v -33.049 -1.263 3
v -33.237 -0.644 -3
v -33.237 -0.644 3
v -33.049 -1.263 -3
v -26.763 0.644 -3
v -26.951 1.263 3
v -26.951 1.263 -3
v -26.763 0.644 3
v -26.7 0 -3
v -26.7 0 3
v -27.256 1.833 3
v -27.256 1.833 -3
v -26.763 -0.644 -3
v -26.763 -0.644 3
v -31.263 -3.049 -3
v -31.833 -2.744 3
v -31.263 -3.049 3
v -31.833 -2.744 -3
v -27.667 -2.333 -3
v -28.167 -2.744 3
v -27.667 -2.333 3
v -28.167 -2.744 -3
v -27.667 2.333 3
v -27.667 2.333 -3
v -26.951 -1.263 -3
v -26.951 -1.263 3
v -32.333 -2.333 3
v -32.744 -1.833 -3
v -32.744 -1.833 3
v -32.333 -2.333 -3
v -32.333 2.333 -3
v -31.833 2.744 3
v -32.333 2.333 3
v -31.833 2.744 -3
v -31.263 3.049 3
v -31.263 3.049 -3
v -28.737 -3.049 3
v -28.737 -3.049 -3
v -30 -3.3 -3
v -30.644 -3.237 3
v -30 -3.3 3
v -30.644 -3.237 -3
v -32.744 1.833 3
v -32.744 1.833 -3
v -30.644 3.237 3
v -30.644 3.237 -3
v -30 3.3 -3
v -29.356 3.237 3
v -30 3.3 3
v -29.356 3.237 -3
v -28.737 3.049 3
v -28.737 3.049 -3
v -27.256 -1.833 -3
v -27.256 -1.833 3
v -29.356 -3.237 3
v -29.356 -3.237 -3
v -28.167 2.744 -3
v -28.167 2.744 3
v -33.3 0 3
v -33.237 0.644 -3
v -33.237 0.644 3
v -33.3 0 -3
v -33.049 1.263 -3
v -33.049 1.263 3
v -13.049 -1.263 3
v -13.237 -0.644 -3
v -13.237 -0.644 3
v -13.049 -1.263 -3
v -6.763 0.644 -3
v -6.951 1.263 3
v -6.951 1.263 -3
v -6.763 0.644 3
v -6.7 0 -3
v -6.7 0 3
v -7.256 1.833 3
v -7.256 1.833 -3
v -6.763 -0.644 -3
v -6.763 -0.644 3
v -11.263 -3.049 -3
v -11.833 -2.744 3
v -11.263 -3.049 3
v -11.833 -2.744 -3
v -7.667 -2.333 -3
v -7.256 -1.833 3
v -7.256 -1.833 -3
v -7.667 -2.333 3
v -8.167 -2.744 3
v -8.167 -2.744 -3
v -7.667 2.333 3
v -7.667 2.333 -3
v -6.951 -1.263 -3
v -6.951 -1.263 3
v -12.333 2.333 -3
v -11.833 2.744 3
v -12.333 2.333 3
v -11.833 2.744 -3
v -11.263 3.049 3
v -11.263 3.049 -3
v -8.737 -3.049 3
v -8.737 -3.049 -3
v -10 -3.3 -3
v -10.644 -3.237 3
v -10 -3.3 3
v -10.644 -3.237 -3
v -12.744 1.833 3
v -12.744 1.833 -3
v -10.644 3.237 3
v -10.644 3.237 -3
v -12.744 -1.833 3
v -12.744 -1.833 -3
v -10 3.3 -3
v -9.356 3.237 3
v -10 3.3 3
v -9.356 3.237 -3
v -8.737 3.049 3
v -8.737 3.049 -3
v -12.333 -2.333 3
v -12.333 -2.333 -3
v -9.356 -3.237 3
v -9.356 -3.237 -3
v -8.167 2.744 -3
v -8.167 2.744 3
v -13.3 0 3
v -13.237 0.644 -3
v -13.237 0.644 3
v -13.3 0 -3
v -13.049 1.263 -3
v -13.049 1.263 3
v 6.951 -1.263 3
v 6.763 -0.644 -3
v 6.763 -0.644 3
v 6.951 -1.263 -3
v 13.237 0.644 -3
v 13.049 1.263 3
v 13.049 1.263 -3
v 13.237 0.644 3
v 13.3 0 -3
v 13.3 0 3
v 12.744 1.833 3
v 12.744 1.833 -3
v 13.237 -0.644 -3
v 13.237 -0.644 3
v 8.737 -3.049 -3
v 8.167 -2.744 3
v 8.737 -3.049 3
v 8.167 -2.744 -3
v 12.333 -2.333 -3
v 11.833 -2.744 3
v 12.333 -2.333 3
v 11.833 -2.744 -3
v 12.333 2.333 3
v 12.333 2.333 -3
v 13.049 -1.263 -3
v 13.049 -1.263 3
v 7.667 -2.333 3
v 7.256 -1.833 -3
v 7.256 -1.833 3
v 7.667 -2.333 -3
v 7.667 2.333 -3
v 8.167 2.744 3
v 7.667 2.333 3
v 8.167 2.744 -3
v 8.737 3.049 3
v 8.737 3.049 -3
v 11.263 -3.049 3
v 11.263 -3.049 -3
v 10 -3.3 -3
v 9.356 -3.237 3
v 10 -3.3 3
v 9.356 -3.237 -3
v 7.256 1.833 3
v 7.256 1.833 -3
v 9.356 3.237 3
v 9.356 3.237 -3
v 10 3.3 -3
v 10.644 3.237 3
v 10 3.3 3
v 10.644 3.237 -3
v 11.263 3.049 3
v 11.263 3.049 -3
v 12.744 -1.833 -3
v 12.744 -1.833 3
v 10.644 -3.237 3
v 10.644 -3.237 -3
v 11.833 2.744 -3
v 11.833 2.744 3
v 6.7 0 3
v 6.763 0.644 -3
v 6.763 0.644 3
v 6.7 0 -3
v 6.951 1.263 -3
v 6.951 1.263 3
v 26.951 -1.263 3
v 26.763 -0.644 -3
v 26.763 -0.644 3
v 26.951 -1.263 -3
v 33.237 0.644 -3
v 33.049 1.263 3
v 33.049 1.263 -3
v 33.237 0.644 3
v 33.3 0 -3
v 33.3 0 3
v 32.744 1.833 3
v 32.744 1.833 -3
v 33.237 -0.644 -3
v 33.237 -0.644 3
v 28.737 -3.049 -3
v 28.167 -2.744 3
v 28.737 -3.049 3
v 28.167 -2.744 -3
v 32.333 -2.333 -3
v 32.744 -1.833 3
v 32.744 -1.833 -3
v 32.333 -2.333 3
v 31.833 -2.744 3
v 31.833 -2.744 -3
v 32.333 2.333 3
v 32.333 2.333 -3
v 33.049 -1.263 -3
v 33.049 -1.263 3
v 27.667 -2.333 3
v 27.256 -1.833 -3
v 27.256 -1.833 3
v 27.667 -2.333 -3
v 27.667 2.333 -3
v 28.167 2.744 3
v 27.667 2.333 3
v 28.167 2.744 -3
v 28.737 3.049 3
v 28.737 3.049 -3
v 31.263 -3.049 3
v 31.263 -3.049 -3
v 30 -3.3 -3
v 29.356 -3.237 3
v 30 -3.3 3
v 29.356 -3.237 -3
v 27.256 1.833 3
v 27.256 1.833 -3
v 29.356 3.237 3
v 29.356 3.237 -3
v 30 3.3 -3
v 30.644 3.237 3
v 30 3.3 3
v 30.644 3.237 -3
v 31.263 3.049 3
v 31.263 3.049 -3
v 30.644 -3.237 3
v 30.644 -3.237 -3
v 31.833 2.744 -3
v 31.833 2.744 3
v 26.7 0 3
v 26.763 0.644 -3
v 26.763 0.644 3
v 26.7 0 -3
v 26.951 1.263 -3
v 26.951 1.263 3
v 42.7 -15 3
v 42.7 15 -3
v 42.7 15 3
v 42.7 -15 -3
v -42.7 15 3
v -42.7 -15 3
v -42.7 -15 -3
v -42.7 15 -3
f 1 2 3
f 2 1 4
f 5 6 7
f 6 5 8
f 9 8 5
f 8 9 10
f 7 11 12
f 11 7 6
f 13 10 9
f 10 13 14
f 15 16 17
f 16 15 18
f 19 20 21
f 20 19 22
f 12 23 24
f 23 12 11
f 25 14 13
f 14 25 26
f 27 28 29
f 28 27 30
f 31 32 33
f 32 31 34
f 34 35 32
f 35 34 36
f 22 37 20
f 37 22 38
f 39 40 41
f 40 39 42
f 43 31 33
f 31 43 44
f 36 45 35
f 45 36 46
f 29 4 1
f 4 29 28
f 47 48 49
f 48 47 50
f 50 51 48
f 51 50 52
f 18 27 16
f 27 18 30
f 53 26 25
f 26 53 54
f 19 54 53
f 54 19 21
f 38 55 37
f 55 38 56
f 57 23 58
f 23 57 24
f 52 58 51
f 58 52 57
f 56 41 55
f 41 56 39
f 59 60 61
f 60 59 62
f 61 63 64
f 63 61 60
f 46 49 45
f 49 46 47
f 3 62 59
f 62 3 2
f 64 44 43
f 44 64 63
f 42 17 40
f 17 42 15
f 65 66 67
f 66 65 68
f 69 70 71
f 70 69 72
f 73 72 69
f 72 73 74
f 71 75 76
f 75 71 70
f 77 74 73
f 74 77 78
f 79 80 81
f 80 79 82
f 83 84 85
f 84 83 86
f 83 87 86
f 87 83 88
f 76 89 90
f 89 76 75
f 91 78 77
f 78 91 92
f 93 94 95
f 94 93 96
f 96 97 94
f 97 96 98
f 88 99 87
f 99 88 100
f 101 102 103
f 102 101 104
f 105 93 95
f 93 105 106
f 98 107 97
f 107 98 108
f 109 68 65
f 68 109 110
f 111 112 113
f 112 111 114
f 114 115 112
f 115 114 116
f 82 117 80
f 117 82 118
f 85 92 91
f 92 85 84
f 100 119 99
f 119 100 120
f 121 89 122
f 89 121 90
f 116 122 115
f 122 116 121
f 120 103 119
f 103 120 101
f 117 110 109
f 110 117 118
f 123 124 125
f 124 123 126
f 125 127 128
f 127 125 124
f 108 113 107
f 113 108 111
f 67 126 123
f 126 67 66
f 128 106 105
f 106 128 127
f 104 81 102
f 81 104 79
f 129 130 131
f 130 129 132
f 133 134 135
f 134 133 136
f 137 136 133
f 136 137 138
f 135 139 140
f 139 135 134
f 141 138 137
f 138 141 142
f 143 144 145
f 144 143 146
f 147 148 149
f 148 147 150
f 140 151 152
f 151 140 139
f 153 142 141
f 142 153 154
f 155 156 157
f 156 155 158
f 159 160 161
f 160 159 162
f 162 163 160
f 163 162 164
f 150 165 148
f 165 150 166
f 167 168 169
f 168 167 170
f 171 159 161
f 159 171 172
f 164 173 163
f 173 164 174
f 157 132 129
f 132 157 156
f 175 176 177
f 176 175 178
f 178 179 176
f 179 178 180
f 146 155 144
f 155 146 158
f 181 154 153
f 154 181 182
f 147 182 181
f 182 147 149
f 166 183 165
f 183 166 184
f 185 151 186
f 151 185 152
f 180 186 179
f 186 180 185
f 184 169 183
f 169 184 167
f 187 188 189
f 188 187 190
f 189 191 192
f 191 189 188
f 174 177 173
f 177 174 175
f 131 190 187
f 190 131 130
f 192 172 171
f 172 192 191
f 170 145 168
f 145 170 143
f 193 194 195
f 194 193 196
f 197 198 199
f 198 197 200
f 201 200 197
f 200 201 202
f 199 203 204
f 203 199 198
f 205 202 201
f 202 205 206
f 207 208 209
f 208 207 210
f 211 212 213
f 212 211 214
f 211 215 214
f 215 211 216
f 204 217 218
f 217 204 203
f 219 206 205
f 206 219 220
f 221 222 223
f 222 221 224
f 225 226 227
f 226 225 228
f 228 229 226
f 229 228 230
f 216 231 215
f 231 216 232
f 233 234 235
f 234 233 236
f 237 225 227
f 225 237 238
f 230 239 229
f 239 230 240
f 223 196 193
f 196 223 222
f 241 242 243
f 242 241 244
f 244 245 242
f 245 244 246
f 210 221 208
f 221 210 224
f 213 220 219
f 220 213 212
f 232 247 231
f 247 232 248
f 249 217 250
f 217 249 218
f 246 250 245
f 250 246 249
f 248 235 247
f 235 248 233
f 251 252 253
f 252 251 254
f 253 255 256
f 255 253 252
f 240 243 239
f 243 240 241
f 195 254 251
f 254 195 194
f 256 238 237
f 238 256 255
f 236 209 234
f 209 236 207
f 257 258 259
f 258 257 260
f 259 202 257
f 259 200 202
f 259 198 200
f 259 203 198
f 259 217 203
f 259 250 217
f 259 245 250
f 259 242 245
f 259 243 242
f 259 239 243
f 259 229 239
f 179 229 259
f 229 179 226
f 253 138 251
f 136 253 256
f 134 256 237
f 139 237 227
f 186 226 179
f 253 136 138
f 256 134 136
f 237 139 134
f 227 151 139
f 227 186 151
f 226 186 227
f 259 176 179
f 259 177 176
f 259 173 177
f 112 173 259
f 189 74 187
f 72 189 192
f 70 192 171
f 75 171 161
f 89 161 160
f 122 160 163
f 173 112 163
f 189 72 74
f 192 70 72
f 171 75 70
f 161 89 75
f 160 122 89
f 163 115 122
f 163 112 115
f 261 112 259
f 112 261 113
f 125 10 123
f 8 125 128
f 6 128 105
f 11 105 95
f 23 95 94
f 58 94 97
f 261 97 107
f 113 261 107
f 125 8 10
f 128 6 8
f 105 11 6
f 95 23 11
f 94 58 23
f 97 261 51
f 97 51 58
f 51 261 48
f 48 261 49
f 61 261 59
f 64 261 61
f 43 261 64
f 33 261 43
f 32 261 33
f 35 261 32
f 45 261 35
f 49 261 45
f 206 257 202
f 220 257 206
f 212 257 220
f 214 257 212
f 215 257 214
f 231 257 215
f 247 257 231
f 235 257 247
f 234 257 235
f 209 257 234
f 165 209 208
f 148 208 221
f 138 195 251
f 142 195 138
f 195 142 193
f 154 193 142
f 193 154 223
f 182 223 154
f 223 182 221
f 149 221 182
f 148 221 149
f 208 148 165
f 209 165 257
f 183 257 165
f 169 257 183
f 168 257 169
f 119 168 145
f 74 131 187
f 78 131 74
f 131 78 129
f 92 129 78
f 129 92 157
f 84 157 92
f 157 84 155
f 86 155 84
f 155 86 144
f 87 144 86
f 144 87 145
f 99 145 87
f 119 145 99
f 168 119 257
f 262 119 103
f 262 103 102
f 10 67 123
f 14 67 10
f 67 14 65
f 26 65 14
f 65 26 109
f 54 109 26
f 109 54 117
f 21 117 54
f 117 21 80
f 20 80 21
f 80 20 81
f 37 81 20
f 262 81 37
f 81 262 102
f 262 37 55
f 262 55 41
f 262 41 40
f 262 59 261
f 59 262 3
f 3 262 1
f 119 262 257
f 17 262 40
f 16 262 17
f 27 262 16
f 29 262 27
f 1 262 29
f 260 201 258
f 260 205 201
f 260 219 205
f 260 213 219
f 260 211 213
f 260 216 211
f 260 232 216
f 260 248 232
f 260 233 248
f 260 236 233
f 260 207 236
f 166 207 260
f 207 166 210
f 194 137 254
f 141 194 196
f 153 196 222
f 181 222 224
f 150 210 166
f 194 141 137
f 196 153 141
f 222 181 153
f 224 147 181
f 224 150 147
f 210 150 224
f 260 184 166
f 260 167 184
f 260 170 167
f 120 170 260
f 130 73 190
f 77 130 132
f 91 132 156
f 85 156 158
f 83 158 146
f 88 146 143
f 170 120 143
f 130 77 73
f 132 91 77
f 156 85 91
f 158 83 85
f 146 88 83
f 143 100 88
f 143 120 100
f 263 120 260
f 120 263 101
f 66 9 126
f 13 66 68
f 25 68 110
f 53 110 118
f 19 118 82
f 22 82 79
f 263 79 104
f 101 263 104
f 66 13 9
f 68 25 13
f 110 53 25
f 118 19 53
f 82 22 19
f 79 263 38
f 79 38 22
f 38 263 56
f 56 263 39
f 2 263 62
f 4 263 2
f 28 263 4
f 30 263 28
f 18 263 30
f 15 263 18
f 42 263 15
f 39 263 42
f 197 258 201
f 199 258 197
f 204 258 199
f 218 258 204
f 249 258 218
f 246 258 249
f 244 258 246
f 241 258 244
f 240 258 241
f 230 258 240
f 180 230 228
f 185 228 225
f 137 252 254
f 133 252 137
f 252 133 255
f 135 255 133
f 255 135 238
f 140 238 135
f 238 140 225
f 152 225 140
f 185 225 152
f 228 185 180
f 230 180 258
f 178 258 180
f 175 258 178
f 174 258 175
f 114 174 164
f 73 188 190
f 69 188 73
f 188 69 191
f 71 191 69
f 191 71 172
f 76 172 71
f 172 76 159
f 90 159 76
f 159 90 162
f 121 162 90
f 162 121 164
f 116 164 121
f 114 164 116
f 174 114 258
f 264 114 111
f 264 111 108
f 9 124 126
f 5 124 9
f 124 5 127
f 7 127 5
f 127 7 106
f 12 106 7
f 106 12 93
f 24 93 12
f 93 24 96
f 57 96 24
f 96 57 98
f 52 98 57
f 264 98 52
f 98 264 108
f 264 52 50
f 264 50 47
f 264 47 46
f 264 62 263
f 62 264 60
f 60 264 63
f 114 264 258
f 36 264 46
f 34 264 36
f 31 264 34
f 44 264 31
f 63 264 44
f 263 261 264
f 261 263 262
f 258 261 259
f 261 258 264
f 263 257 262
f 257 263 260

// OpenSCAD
$fn = 32;

// ----------------------------------------------------------------------
// Hole bar, 4 x Ø6.6
// row layout, 12.7 mm edge offset
// ----------------------------------------------------------------------

// --- parameters (mm) ---
bar_w = 30;    // bar width (Y)
bar_t = 6;     // bar thickness (Z)
holes = 4;     // holes per row
hole_d = 6.6;  // hole diameter
edge = 12.7;   // offset from the bar end to the first hole
pitch = 20;    // pitch between neighbouring holes

// --- derived feature positions (mm) ---
span = (holes - 1) * pitch;   // = 60   distance between the end holes
bar_l = span + 2 * edge;      // = 85.4   overall bar length
start_x = -bar_l / 2 + edge;  // = -30   X of the first hole
feature_centers = [
  [start_x + 0 * pitch, 0],
  [start_x + 1 * pitch, 0],
  [start_x + 2 * pitch, 0],
  [start_x + 3 * pitch, 0]
];   // hole centres of the first row

// bar with one row of holes, drilled from feature_centers
difference() {
  translate([-bar_l / 2, -bar_w / 2, -bar_t / 2]) cube([bar_l, bar_w, bar_t]);
  for (centre = feature_centers)
    translate([centre[0], centre[1], 0])
      cylinder(d = hole_d, h = bar_t + 2, center = true);
}
